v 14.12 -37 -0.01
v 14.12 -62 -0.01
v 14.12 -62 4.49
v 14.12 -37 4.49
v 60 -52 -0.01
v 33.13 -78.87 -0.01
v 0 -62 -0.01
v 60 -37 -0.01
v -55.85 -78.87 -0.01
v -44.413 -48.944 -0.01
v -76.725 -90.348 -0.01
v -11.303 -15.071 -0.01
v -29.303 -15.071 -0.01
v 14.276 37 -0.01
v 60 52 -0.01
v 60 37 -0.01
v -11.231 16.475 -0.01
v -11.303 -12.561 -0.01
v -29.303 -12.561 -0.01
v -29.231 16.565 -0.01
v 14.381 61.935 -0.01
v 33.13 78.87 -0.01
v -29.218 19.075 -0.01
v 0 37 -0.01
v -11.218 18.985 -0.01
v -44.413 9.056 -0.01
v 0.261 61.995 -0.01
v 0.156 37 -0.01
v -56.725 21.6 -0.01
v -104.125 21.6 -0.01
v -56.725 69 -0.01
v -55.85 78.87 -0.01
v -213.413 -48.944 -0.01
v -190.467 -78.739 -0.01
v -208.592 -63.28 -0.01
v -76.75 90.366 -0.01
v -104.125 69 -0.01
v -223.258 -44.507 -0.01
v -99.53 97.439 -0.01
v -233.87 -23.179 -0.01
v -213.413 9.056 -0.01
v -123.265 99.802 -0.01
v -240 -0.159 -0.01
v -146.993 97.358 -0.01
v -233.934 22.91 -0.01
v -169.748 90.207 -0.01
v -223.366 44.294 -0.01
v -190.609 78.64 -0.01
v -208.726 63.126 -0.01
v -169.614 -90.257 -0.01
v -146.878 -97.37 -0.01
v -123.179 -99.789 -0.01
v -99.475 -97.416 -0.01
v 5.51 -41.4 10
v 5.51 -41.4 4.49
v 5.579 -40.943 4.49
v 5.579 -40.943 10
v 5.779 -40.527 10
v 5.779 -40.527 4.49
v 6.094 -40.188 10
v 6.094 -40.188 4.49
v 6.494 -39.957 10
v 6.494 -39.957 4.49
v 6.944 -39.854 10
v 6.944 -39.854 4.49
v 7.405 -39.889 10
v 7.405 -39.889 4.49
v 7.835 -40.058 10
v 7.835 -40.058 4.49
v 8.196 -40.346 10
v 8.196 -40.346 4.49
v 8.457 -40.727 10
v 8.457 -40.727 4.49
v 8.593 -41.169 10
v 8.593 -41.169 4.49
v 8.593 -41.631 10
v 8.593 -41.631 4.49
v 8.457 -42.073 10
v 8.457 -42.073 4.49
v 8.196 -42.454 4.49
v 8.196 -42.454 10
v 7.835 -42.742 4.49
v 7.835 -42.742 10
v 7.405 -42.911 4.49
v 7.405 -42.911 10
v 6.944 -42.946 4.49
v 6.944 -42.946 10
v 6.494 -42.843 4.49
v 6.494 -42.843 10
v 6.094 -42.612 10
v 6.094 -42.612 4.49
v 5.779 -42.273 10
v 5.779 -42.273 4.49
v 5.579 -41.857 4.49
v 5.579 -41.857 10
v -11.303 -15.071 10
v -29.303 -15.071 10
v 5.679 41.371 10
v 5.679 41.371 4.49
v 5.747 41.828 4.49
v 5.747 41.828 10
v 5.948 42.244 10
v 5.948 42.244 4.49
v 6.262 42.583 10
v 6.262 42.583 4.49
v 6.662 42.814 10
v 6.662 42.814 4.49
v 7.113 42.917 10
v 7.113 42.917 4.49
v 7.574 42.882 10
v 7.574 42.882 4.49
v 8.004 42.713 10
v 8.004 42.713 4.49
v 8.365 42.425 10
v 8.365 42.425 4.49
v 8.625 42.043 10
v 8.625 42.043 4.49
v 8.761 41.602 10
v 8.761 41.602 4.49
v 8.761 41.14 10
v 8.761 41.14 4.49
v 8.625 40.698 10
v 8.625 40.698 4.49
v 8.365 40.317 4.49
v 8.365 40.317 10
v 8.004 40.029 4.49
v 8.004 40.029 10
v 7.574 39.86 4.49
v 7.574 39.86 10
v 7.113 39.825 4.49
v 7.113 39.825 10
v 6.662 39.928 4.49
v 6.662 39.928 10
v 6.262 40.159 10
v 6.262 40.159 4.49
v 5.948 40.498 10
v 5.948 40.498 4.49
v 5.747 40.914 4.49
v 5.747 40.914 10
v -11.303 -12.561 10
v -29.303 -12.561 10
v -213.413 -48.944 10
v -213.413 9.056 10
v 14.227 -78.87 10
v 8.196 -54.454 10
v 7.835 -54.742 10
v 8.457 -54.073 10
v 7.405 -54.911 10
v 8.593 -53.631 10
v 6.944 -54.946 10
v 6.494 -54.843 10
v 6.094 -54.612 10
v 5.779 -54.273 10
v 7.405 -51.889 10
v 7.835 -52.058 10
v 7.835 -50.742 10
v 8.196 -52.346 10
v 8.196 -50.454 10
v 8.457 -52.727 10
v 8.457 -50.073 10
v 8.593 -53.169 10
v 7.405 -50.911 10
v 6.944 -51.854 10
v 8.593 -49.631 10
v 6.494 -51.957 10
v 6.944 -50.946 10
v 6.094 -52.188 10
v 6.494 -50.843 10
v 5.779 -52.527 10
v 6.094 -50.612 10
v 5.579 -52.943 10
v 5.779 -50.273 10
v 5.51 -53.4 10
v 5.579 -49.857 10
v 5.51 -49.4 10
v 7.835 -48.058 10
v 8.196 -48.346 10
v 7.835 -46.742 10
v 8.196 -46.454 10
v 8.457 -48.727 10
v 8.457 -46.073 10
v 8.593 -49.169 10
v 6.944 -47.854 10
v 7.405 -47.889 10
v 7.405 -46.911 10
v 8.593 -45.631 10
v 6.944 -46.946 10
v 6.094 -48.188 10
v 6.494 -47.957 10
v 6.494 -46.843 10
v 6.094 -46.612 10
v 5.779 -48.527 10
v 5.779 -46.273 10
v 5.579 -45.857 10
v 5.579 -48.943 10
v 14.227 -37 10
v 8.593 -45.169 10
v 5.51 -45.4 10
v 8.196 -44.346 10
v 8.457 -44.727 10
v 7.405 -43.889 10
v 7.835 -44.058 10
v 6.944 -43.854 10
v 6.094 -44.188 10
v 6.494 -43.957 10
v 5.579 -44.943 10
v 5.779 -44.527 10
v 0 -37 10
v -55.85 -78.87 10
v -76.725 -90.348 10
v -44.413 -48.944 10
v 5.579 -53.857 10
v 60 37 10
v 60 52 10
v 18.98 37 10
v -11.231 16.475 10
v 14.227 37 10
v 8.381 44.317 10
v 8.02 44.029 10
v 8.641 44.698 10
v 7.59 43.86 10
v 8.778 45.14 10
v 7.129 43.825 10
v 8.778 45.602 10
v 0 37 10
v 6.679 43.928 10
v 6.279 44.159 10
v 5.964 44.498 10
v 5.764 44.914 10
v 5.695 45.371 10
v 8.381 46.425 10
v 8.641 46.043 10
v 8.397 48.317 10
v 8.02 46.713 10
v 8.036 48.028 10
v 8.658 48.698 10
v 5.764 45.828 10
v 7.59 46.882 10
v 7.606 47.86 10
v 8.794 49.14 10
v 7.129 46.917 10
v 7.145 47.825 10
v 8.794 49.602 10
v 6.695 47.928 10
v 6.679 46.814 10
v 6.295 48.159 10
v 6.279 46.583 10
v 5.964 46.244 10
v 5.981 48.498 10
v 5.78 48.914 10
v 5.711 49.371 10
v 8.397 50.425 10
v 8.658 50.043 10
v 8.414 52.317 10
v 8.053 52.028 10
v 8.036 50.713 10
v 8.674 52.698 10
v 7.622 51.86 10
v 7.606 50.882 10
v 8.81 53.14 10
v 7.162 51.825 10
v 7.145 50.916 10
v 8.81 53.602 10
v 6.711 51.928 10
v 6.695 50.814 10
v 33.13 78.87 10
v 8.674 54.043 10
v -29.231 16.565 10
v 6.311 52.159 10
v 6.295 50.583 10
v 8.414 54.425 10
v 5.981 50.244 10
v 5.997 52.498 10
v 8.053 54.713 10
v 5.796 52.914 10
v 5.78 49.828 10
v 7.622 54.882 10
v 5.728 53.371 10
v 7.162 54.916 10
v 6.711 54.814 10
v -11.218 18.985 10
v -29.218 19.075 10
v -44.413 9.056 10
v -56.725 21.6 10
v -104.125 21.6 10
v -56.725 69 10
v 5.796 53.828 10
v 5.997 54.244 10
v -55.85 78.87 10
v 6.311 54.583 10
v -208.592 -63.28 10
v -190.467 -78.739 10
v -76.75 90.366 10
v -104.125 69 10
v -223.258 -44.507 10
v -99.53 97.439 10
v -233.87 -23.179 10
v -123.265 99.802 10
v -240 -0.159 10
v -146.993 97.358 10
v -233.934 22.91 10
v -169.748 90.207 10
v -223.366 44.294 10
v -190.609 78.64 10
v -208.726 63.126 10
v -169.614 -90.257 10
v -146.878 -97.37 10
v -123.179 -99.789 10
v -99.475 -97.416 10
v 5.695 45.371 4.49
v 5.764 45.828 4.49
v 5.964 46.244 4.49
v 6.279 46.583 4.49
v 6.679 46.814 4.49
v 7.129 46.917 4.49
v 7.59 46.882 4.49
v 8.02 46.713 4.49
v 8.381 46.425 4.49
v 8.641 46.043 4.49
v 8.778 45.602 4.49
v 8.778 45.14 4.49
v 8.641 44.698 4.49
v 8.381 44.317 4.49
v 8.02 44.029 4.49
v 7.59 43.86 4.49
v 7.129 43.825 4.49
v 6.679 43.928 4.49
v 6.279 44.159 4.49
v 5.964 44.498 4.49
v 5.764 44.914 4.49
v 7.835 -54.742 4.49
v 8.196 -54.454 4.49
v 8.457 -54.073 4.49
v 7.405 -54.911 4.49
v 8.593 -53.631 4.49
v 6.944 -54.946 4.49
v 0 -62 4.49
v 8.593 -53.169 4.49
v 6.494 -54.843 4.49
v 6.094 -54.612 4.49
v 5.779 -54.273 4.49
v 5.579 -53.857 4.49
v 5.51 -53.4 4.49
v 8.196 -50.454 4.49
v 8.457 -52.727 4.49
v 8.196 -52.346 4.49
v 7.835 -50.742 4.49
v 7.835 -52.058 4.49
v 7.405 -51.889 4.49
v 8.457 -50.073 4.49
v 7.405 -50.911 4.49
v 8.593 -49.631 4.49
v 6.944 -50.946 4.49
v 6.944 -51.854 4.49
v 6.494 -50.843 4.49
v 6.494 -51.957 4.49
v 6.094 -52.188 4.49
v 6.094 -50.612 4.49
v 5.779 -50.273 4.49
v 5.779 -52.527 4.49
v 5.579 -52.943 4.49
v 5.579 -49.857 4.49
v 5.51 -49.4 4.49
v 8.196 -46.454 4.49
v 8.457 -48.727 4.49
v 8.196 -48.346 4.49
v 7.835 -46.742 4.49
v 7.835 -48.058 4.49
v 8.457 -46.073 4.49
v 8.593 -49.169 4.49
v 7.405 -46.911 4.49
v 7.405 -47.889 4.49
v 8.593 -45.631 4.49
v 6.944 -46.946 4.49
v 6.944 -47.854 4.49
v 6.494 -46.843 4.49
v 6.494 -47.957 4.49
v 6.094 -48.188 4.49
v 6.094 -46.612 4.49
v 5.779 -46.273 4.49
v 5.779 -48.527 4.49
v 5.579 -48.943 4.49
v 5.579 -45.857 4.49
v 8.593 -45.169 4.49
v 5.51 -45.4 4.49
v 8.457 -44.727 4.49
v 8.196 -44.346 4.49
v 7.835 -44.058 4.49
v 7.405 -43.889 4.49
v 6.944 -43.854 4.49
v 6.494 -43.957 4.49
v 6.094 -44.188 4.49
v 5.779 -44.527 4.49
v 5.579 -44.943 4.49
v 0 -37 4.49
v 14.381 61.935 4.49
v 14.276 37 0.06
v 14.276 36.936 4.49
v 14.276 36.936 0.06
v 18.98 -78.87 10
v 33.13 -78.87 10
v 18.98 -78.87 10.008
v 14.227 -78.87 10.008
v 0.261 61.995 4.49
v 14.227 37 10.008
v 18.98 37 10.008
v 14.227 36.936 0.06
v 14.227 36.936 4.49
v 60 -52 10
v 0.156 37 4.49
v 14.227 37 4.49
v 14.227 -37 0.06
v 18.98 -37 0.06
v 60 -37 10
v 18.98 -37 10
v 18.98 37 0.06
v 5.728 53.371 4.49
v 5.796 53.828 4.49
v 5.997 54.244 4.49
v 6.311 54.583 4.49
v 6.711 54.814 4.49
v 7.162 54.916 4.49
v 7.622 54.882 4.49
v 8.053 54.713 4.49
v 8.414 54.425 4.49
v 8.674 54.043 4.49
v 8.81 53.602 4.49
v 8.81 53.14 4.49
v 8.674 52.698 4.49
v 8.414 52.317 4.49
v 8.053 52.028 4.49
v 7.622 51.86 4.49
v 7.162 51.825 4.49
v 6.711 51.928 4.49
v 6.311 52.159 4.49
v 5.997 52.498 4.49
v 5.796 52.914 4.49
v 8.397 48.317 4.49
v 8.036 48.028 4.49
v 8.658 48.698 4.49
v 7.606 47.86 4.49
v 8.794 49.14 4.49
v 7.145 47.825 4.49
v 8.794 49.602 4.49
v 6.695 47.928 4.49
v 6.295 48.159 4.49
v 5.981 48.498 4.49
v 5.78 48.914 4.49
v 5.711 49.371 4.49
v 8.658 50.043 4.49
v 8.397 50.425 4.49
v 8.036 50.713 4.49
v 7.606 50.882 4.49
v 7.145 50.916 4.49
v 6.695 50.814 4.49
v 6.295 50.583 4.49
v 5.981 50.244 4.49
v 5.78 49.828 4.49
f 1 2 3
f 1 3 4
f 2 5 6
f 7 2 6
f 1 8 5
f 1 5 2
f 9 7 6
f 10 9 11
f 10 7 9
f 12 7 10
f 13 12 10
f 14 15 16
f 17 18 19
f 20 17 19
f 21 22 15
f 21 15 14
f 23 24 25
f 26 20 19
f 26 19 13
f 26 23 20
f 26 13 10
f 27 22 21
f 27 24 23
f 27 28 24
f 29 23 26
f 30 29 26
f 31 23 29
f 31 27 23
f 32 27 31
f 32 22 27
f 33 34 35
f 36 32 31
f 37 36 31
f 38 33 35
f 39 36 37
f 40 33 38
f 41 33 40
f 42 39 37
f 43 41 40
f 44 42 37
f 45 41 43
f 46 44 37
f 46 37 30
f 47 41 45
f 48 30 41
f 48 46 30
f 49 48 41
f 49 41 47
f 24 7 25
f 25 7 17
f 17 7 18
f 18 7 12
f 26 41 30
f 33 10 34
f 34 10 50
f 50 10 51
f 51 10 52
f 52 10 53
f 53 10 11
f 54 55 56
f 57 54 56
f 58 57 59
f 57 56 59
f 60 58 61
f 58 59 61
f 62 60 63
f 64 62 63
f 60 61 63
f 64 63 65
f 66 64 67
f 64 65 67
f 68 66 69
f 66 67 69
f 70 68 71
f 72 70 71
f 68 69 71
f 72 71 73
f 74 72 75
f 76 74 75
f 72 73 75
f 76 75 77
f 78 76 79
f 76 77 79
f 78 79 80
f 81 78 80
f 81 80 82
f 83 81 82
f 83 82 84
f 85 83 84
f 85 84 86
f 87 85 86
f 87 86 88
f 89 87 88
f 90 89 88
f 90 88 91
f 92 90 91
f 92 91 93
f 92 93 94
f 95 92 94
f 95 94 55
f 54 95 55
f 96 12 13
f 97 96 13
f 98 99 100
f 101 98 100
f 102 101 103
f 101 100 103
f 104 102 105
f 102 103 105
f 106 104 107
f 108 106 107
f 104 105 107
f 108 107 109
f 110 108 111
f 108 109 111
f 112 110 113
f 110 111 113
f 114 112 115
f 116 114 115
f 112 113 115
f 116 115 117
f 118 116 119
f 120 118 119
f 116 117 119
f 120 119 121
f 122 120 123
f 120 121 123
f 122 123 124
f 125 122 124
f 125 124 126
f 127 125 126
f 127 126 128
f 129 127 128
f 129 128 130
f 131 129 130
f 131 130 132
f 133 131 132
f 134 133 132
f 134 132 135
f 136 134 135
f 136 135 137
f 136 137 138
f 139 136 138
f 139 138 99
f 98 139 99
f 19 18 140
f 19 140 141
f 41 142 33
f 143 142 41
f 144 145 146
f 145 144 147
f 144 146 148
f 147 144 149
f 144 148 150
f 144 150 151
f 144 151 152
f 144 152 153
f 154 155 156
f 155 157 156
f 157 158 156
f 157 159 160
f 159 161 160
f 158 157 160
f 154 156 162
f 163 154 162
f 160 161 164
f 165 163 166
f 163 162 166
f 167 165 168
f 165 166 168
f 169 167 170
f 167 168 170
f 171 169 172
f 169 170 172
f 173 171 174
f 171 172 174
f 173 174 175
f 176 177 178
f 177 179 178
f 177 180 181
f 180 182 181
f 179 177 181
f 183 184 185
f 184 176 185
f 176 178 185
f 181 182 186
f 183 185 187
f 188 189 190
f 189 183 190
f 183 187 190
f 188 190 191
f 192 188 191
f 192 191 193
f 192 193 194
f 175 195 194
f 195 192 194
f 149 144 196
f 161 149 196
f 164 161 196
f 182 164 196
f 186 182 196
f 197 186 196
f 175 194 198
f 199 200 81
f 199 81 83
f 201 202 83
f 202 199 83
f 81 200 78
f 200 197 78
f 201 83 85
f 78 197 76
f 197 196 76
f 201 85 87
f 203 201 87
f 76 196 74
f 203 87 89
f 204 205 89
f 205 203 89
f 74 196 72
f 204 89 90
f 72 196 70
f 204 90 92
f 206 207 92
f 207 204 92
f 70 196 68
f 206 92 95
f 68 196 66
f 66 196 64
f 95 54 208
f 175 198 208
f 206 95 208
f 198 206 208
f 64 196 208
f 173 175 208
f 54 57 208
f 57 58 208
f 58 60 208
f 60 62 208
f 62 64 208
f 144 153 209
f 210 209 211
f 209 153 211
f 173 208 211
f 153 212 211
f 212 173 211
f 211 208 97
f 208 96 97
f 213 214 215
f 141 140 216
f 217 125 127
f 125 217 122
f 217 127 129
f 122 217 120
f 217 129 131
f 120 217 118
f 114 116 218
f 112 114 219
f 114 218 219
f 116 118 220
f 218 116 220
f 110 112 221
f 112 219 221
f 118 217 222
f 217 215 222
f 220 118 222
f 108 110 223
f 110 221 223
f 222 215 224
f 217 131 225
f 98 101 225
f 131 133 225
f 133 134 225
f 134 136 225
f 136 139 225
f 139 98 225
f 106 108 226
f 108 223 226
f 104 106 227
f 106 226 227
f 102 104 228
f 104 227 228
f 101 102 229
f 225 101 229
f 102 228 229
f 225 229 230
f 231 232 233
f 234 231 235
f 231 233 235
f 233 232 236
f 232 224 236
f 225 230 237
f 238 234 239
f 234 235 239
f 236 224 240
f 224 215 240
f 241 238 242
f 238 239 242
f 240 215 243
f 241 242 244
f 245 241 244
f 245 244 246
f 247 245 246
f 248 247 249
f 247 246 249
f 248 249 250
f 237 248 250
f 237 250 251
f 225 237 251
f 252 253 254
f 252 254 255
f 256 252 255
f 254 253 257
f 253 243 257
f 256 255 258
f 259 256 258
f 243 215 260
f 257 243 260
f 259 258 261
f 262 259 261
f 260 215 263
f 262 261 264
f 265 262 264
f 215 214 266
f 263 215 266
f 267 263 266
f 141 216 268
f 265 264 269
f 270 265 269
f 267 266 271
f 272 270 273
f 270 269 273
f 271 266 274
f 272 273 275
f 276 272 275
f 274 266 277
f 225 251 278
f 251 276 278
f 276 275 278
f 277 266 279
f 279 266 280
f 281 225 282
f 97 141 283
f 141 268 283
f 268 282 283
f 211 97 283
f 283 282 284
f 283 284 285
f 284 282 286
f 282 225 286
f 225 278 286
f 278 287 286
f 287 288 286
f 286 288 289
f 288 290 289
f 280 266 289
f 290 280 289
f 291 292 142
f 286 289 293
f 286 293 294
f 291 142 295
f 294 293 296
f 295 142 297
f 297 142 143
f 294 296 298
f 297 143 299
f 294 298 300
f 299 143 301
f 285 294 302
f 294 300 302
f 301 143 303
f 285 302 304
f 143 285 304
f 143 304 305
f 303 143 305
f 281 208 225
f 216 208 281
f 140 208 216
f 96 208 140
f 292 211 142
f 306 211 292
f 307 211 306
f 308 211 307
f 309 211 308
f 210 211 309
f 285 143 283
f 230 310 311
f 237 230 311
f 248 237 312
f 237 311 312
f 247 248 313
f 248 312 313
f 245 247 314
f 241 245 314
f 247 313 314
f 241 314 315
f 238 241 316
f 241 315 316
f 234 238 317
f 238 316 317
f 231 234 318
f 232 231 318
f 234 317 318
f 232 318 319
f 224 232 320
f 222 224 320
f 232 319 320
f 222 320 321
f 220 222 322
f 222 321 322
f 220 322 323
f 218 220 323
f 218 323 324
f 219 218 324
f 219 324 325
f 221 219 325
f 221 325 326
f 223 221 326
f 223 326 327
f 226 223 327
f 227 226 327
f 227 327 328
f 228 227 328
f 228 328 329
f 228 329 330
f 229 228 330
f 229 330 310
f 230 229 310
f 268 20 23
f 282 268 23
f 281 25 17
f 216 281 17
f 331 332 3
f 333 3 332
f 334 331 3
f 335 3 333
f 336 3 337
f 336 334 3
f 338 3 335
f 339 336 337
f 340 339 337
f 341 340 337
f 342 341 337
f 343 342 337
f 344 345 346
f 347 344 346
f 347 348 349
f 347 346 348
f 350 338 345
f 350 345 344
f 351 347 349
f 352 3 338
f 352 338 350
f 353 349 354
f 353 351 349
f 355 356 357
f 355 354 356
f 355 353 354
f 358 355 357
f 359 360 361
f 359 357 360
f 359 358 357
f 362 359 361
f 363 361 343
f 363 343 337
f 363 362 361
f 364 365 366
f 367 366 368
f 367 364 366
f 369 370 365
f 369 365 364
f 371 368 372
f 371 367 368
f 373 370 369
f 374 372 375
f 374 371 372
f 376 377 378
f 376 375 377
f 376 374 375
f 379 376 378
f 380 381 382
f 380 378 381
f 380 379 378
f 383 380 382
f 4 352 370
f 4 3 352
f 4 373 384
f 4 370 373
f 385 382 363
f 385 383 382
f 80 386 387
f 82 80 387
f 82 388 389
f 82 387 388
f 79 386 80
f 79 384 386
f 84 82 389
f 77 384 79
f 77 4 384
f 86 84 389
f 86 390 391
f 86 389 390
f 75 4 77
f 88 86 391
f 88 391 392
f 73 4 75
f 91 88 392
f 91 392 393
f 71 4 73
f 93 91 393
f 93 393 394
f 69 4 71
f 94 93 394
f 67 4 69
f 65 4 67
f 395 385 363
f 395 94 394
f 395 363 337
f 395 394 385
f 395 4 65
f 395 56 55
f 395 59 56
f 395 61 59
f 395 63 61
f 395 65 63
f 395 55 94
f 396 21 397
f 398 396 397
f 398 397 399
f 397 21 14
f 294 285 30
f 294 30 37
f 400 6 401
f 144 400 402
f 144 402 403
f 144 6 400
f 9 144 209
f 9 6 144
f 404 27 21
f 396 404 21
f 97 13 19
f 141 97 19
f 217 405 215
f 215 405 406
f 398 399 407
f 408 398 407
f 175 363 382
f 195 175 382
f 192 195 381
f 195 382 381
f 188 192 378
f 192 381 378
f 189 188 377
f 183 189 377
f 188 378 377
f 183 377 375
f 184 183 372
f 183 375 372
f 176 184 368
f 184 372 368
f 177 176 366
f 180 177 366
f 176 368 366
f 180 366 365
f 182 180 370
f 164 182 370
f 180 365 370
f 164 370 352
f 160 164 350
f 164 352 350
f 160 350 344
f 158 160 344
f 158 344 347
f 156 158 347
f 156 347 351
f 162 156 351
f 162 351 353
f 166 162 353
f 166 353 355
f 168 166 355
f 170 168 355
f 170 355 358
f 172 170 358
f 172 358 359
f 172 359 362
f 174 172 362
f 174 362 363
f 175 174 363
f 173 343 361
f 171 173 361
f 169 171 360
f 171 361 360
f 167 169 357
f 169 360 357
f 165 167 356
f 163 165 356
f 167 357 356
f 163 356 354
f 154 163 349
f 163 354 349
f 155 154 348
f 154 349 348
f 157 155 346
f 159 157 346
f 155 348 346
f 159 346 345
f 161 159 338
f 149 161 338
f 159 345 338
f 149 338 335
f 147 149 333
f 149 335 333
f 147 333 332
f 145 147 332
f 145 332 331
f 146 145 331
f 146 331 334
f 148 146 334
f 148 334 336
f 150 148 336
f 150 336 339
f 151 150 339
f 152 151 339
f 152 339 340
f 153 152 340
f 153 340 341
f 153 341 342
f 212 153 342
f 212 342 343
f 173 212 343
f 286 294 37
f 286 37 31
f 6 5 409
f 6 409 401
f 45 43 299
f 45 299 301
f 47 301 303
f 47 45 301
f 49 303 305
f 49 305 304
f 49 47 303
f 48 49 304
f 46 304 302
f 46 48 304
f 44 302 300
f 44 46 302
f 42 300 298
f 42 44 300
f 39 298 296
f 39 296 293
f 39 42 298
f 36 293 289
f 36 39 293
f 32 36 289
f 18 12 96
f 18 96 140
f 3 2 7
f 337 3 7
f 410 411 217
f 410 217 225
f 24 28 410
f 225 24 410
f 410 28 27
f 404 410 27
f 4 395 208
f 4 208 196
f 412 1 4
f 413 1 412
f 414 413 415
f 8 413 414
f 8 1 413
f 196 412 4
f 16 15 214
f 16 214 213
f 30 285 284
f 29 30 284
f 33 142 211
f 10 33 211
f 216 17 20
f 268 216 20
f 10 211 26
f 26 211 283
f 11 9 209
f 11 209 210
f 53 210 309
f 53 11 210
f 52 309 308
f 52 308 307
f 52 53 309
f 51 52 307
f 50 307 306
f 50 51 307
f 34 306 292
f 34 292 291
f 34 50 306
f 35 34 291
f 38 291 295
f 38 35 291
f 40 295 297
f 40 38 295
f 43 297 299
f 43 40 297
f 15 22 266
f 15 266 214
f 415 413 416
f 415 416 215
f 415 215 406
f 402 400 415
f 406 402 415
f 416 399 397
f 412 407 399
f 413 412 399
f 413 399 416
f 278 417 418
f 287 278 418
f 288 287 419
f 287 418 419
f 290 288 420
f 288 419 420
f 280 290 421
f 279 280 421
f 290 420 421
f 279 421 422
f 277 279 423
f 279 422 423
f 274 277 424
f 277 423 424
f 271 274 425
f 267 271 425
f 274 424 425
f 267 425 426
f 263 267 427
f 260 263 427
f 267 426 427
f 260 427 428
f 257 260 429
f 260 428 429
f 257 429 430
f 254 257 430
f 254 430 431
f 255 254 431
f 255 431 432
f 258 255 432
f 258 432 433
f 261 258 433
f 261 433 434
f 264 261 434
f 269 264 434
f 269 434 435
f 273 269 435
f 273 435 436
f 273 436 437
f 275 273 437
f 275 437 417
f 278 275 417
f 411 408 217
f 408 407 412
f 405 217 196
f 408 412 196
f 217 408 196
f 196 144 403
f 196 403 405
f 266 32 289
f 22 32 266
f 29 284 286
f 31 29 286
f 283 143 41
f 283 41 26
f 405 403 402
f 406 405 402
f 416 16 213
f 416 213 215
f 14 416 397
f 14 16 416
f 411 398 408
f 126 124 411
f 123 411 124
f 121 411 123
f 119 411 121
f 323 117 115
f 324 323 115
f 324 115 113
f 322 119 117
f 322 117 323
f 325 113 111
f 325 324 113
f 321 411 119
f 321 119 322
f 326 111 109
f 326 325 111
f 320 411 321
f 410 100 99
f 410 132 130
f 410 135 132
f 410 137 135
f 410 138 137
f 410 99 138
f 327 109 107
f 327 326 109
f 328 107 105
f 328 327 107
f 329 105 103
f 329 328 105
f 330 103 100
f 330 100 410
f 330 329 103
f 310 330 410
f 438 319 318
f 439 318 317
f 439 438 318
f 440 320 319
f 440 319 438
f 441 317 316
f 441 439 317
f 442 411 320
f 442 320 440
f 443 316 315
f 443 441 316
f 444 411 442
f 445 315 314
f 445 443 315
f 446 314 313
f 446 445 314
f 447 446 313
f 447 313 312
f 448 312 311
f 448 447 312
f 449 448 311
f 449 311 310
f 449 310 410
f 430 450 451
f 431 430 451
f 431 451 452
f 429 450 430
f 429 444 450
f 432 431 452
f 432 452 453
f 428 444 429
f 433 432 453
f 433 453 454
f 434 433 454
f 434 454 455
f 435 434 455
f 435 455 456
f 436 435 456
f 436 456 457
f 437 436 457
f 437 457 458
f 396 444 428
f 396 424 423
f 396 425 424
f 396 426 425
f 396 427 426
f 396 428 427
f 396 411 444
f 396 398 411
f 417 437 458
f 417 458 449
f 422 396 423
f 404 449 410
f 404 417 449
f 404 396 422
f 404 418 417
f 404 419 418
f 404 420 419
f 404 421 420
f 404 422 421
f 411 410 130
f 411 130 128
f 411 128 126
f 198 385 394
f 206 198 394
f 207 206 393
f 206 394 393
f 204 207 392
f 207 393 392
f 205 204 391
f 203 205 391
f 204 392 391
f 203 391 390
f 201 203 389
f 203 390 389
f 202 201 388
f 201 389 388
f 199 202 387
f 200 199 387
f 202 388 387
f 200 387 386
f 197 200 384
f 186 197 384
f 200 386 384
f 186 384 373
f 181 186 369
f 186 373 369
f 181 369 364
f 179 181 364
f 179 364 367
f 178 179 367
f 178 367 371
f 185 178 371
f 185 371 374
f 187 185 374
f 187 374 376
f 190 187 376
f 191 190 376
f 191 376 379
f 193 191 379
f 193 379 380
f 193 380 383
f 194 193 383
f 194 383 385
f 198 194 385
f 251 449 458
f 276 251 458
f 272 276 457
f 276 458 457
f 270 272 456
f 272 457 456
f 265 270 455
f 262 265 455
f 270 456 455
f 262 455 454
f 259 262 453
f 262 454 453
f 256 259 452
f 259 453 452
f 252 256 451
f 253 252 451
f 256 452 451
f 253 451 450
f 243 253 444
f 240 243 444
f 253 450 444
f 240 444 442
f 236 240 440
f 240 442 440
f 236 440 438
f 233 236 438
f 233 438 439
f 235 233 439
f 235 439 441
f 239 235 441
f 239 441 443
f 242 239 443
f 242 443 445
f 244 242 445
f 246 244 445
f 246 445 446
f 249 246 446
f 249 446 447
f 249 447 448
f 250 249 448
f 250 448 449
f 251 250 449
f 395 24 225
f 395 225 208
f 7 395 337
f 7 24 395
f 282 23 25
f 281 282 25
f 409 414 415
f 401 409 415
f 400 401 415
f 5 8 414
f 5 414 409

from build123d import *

# Parameters (mm, degrees)
BOSS_EXTRUDE1_DEPTH      = 10
BOSS_EXTRUDE1_DEPTH_BACK = 0.01
SKETCH7_W                = 169
SKETCH7_H                = 58
CUT_EXTRUDE4_DEPTH       = 261.116514656
SKETCH18_W               = 47.4
SKETCH18_H               = 47.4
CUT_EXTRUDE18_DEPTH      = 261.116514656
SKETCH28_W               = 4.75290021
SKETCH28_H               = 9.947843747
BOSS_EXTRUDE6_DEPTH      = 115.870057685
SKETCH30_W               = 14.12
SKETCH30_H               = 25
CUT_EXTRUDE25_DEPTH      = 4.5
SKETCH33_R               = 1.55
CUT_EXTRUDE26_DEPTH      = 10.01
SKETCH44_W               = 18
SKETCH44_H               = 2.51
CUT_EXTRUDE30_DEPTH      = 10.01


with BuildPart() as part:
    # Sketch1 → Boss-Extrude1 (new, two sides: drawn at the far end of the back side and taken through both)
    with BuildSketch(Plane.XY.offset(-BOSS_EXTRUDE1_DEPTH_BACK)):
        with BuildLine():
            Line((0, 0), (0, -37))
            Line((0, -37), (60, -37))
            Line((60, -37), (60, -52))
            Line((60, -52), (33.129942315, -78.870057685))
            Line((33.129942315, -78.870057685), (-55.850057685, -78.870057685))
            ThreePointArc((-55.850057685, -78.870057685), (-169.614041234, -90.257166815), (-239.999947532, -0.158696229))
            ThreePointArc((-239.999947532, -0.158696229), (-169.748285548, 90.207490359), (-55.850057685, 78.870057685))
            Line((-55.850057685, 78.870057685), (33.129942315, 78.870057685))
            Line((33.129942315, 78.870057685), (60, 52))
            Line((60, 52), (60, 37))
            Line((60, 37), (0, 37))
            Line((0, 37), (0, 0))
        make_face()
    extrude(amount=BOSS_EXTRUDE1_DEPTH + BOSS_EXTRUDE1_DEPTH_BACK)

    # Sketch7 → Cut-Extrude4 (cut, through all)
    with BuildSketch(Plane.XY.offset(10)):
        with Locations((-128.91309413, -19.94383898)):
            Rectangle(SKETCH7_W, SKETCH7_H)
    extrude(amount=-CUT_EXTRUDE4_DEPTH, mode=Mode.SUBTRACT)

    # Sketch18 → Cut-Extrude18 (cut, through all)
    with BuildSketch(Plane.XY.offset(10)):
        with Locations((-80.42454895, 45.3)):
            Rectangle(SKETCH18_W, SKETCH18_H)
    extrude(amount=-CUT_EXTRUDE18_DEPTH, mode=Mode.SUBTRACT)

    # Sketch28 → Boss-Extrude6 (add)
    with BuildSketch(Plane.XZ.offset(78.870057685)):
        with Locations((16.603067585, 5.033719824)):
            Rectangle(SKETCH28_W, SKETCH28_H)
    extrude(amount=-BOSS_EXTRUDE6_DEPTH)

    # Sketch30 → Cut-Extrude25 (cut)
    with BuildSketch(Plane(origin=(0, 0, -0.01), x_dir=(-1, 0, 0), z_dir=(0, 0, -1))):
        with Locations((-7.06, -49.5)):
            Rectangle(SKETCH30_W, SKETCH30_H)
        Polygon((-14.38072485, 61.935396467), (-14.275539526, 36.935617747), (-0.155664505, 36.995026418), (-0.260849829, 61.994805138), align=None)
    extrude(amount=-CUT_EXTRUDE25_DEPTH, mode=Mode.SUBTRACT)

    # Sketch33 → Cut-Extrude26 (cut)
    with BuildSketch(Plane(origin=(0, 0, -0.01), x_dir=(-1, 0, 0), z_dir=(0, 0, -1))):
        with Locations((-7.06, -53.4)):
            Circle(SKETCH33_R)
        with Locations((-7.06, -49.4)):
            Circle(SKETCH33_R)
        with Locations((-7.06, -45.4)):
            Circle(SKETCH33_R)
        with Locations((-7.06, -41.4)):
            Circle(SKETCH33_R)
        with Locations((-7.228632788, 41.370889137)):
            Circle(SKETCH33_R)
        with Locations((-7.244931474, 45.370855931)):
            Circle(SKETCH33_R)
        with Locations((-7.261230159, 49.370822725)):
            Circle(SKETCH33_R)
        with Locations((-7.277528845, 53.370789519)):
            Circle(SKETCH33_R)
    extrude(amount=-CUT_EXTRUDE26_DEPTH, mode=Mode.SUBTRACT)

    # Sketch44 → Cut-Extrude30 (cut)
    with BuildSketch(Plane(origin=(0, 0, -0.01), x_dir=(-1, 0, 0), z_dir=(0, 0, -1))):
        with Locations((20.303305502, -13.815974066)):
            Rectangle(SKETCH44_W, SKETCH44_H)
        Polygon((29.23066644, 16.565007379), (29.218146833, 19.074976156), (11.218370746, 18.985194117), (11.230890353, 16.47522534), align=None)
    extrude(amount=-CUT_EXTRUDE30_DEPTH, mode=Mode.SUBTRACT)


solid = part.part
